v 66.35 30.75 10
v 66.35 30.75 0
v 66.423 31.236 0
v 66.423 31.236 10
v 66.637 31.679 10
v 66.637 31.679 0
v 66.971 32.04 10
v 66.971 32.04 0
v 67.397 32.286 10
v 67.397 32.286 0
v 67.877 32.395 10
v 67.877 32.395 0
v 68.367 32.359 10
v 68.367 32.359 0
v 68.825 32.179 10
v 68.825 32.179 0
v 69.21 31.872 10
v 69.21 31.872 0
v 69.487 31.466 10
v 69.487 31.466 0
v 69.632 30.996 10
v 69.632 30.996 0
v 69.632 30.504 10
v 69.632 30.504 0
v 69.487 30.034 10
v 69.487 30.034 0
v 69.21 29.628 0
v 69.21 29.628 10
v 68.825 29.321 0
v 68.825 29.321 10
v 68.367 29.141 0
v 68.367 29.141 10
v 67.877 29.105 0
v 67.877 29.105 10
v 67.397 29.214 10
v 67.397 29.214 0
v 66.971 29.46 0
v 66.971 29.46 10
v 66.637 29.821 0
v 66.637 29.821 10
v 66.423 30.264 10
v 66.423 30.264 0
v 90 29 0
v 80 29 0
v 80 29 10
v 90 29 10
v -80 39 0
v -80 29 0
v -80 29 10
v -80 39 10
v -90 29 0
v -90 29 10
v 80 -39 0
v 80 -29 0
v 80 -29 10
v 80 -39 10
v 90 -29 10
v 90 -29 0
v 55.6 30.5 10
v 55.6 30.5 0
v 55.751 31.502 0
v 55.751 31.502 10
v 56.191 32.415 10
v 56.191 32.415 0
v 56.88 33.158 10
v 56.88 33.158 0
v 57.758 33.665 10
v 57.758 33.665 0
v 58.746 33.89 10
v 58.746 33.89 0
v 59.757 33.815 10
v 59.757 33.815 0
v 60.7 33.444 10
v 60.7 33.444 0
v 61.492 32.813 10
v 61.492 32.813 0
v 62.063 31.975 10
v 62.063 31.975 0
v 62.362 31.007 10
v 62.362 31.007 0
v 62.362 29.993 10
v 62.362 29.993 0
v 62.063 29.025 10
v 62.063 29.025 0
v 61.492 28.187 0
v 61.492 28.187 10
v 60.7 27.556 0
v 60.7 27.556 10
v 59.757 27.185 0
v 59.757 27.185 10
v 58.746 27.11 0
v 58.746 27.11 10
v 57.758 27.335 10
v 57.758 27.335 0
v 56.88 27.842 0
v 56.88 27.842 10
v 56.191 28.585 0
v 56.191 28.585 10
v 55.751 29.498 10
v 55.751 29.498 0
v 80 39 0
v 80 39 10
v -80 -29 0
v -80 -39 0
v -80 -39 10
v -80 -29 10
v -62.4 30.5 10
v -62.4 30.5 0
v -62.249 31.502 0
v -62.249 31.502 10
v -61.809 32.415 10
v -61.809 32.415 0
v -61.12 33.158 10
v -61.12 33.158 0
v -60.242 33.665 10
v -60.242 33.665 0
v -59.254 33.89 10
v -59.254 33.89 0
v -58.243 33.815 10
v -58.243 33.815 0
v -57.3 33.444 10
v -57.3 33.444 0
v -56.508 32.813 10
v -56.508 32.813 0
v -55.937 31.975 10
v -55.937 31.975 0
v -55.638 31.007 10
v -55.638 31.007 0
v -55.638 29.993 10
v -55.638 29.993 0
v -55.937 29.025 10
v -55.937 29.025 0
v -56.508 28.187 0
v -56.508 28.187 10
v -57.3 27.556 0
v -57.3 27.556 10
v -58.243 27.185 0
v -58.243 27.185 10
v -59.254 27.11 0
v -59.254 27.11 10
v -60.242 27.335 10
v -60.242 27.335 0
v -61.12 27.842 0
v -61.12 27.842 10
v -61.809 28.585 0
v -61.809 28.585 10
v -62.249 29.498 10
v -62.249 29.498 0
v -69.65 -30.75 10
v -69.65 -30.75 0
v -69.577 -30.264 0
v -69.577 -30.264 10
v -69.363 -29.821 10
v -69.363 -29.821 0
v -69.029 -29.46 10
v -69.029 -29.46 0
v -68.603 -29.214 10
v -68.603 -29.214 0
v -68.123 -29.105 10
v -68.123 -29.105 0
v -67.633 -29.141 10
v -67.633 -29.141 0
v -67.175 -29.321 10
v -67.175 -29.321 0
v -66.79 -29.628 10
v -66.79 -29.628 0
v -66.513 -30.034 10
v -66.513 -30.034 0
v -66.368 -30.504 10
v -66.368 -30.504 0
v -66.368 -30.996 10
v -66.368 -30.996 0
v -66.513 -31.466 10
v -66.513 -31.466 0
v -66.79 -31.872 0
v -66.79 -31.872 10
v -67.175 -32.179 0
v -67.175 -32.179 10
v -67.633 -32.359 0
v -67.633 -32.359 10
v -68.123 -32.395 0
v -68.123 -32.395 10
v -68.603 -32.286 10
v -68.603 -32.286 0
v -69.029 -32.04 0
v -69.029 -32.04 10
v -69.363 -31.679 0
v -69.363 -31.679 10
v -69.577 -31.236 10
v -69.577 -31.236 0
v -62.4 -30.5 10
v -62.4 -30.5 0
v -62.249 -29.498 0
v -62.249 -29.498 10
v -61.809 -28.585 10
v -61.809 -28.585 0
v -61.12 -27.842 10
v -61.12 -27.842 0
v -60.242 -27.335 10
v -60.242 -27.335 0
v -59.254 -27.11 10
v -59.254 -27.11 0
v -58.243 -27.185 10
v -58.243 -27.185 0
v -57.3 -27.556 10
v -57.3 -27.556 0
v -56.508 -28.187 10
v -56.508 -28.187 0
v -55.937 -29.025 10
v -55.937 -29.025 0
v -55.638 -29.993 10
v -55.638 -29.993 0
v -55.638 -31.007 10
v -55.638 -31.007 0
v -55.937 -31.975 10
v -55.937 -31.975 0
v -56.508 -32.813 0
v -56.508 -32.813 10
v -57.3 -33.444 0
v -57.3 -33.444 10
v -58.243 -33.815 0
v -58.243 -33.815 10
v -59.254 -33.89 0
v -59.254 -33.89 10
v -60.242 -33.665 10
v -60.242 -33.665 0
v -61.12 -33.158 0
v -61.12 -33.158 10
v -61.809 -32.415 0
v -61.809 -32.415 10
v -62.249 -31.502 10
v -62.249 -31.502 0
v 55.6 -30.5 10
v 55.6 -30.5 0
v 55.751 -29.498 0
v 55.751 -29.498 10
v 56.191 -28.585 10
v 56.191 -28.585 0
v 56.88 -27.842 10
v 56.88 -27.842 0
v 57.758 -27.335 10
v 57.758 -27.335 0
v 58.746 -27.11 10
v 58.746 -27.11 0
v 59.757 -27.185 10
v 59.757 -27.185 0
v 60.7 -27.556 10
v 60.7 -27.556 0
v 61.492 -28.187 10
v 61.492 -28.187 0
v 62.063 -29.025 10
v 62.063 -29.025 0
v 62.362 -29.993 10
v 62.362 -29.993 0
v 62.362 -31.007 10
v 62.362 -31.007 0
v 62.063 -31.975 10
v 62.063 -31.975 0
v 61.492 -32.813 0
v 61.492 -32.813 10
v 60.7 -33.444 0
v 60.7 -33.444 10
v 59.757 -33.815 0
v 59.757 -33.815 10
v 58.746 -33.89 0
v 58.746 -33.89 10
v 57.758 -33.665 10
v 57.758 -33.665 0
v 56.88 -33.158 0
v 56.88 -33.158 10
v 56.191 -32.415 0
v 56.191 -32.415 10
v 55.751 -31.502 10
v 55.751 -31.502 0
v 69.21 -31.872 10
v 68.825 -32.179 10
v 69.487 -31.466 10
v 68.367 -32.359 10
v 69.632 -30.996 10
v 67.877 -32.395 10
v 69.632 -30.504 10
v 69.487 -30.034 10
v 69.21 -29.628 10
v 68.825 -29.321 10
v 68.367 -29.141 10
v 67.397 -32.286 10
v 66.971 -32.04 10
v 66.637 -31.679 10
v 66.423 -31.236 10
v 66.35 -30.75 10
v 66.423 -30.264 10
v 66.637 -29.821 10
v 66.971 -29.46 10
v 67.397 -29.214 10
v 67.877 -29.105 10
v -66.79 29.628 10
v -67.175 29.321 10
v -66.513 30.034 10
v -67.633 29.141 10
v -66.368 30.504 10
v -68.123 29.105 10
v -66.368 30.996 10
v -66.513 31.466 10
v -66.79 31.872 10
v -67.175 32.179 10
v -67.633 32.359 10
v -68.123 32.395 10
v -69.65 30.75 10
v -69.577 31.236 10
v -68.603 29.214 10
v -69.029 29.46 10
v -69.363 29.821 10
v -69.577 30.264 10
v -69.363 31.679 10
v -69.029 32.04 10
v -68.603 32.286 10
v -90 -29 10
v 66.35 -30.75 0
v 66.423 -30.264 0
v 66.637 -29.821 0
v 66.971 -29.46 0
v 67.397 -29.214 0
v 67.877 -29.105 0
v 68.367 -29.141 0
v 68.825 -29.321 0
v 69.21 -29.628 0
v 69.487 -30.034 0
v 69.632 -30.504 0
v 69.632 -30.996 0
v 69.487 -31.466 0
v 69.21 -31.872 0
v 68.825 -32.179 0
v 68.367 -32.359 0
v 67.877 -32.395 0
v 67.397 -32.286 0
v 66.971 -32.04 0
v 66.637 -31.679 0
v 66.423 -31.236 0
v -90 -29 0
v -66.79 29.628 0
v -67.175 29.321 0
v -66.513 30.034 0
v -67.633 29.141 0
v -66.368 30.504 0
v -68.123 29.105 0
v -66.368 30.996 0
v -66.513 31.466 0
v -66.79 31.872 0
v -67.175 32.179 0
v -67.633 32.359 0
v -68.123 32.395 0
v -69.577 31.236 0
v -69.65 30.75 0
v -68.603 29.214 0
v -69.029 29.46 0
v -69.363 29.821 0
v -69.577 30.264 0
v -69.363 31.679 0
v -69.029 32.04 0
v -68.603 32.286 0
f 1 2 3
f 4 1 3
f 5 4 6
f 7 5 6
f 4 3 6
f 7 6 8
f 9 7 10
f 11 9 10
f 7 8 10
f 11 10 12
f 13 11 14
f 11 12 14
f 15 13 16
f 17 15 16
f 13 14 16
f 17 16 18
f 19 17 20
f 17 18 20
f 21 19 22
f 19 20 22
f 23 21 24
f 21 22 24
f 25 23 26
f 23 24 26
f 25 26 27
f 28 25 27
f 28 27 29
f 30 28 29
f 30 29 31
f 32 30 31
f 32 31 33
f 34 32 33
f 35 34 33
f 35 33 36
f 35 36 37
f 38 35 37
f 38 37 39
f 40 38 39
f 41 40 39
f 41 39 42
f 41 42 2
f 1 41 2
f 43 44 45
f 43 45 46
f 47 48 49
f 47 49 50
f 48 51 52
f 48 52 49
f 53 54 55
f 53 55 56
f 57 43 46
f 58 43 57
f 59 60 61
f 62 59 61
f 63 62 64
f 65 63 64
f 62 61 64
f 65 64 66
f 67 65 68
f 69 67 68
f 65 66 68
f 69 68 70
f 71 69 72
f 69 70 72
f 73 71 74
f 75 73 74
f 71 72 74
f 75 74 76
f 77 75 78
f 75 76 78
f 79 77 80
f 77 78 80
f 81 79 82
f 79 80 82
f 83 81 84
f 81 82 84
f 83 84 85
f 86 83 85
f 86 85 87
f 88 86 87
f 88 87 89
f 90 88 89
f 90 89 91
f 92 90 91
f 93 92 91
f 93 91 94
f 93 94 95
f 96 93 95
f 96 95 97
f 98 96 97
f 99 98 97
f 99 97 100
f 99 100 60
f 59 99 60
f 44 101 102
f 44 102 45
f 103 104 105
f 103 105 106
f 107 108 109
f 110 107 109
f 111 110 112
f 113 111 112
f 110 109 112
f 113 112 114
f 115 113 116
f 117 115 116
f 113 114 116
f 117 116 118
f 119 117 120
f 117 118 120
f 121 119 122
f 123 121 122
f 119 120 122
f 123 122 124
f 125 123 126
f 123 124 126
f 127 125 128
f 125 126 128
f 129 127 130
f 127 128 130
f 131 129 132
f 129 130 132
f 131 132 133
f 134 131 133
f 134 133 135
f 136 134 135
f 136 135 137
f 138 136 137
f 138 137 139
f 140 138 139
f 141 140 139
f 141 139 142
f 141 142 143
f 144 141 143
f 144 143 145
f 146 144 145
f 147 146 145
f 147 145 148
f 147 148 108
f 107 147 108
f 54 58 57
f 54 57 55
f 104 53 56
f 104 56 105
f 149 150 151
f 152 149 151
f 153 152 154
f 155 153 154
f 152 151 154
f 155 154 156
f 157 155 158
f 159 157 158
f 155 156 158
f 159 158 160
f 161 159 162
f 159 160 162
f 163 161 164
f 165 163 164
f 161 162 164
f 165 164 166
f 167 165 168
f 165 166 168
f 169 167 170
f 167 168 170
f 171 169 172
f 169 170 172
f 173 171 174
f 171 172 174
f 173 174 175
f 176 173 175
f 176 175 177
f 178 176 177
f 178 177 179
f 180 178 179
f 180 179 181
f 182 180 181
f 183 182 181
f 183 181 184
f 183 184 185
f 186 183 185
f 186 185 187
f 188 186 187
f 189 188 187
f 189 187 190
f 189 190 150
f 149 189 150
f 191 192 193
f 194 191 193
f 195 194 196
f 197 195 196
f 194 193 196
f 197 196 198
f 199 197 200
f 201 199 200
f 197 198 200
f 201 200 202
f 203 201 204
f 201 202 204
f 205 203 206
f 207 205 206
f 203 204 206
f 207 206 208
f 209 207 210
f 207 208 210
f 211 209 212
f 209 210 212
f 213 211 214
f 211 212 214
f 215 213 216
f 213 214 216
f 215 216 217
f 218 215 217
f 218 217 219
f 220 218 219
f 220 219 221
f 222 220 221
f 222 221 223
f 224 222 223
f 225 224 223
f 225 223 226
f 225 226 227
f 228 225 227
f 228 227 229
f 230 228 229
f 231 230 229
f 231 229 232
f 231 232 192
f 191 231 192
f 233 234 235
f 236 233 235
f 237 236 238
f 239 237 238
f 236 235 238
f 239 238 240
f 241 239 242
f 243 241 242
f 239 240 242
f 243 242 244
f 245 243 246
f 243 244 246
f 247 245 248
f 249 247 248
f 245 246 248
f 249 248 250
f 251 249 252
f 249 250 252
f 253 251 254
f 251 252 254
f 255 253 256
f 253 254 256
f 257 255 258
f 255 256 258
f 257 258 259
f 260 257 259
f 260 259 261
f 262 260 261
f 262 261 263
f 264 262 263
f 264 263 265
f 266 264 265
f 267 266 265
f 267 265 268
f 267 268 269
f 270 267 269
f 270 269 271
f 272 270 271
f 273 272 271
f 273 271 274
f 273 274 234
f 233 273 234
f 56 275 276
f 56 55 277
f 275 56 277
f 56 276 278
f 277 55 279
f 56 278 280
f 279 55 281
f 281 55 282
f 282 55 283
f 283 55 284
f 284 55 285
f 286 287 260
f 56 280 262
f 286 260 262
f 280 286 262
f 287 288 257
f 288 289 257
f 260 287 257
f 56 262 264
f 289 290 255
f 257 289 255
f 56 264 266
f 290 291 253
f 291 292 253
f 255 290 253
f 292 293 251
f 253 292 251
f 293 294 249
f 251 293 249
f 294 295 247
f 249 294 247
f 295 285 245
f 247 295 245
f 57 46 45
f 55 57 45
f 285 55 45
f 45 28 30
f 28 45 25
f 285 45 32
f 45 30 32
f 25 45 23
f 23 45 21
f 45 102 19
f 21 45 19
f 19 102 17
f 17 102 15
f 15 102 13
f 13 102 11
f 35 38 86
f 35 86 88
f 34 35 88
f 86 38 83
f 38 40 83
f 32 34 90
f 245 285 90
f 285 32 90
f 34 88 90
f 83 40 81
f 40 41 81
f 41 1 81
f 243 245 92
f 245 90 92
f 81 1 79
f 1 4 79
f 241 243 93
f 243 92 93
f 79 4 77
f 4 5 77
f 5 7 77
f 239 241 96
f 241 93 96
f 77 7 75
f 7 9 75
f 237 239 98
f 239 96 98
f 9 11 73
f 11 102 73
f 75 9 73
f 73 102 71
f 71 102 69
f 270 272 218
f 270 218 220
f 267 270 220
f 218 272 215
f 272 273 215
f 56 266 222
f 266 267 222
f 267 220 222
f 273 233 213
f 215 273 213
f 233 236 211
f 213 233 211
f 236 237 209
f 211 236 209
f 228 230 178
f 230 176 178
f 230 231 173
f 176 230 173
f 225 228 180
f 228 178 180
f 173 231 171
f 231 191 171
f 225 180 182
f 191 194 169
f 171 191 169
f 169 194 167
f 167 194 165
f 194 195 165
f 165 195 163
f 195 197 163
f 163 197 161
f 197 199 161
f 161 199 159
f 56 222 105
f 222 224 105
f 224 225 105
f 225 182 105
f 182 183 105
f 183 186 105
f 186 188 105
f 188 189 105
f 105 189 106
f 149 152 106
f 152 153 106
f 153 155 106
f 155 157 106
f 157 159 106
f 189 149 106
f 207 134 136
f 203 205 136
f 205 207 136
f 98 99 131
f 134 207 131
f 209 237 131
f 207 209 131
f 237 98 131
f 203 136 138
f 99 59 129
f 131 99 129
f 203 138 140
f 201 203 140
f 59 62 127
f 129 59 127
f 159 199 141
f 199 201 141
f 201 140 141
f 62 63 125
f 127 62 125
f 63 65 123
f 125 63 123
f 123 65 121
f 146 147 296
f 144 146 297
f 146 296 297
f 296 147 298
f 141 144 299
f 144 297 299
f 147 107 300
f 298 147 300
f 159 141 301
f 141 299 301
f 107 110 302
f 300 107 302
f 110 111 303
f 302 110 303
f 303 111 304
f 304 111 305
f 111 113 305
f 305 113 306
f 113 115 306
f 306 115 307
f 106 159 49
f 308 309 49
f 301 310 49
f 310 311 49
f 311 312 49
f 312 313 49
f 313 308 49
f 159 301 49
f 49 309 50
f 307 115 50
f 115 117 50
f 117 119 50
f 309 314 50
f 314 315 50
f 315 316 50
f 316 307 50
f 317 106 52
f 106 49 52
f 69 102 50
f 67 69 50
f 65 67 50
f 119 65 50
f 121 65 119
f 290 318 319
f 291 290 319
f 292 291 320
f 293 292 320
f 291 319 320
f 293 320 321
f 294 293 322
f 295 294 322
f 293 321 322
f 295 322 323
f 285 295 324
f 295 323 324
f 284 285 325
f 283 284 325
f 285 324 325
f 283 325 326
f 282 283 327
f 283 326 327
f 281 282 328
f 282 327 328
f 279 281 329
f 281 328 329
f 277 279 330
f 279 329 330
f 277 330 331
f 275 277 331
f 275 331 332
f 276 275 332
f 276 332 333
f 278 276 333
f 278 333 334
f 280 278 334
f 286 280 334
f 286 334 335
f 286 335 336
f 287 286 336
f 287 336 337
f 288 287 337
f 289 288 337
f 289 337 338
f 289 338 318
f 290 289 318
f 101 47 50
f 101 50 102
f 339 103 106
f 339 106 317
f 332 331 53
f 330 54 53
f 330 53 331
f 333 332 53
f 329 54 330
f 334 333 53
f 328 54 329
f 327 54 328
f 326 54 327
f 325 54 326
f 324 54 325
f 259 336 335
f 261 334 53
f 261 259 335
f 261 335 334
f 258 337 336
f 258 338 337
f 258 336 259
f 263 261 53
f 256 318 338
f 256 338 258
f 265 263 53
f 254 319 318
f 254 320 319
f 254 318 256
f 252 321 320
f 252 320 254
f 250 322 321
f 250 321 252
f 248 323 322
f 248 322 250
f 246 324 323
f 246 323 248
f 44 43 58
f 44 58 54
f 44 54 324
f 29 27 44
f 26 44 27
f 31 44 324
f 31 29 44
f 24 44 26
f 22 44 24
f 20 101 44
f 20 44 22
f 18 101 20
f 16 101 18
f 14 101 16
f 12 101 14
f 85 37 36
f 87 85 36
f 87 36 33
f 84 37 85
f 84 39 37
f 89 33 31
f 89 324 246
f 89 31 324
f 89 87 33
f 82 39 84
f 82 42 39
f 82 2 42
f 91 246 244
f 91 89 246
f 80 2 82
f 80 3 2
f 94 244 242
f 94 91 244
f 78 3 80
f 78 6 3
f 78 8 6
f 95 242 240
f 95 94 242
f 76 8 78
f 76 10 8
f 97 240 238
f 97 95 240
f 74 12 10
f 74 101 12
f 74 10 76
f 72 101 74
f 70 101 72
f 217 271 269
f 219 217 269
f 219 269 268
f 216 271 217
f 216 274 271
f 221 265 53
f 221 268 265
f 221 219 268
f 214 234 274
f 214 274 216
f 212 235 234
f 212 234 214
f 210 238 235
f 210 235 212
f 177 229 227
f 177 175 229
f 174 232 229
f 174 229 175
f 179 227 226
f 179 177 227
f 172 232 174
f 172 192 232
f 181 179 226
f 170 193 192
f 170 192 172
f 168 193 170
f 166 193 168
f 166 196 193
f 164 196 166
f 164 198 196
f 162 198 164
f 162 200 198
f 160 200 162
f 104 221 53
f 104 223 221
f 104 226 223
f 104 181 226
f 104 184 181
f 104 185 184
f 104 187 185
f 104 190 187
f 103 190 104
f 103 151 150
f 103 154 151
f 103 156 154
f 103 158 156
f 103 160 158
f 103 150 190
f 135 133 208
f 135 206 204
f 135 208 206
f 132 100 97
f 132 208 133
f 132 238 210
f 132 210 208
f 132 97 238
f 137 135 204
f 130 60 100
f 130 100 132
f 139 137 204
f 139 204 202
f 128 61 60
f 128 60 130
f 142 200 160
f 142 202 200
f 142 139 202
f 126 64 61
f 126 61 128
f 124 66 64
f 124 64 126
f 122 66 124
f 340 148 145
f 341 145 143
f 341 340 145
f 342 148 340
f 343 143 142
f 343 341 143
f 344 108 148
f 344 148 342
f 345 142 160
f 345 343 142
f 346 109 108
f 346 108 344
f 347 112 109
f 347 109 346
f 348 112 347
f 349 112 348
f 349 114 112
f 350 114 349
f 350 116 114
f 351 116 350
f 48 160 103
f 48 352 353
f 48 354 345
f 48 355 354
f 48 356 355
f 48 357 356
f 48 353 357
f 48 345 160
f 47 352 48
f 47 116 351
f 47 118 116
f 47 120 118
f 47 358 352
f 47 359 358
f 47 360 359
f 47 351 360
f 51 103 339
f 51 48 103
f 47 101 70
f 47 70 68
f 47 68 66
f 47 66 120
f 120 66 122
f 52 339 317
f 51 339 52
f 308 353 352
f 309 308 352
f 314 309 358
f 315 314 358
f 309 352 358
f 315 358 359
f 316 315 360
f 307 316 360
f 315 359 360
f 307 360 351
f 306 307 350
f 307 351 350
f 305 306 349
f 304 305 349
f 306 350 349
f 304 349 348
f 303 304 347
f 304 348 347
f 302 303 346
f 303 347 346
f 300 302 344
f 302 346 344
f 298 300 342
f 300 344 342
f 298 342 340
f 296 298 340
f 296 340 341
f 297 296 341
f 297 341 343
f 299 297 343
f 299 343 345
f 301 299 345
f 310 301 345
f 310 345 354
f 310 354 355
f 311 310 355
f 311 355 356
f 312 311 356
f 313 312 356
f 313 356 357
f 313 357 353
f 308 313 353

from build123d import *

# Parameters (mm, degrees)
BOSS_EXTRUDE1_DEPTH = 10
M4_TAPPED_HOLE1_D   = 3.3
M8_TAPPED_HOLE1_D   = 6.8


with BuildPart() as part:
    # Sketch1 → Boss-Extrude1 (new body)
    with BuildSketch(Plane.XY):
        Polygon((-80, 39), (80, 39), (80, 29), (90, 29), (90, -29), (80, -29), (80, -39), (-80, -39), (-80, -29), (-90, -29), (-90, 29), (-80, 29), align=None)
    extrude(amount=BOSS_EXTRUDE1_DEPTH)

    # M4 Tapped Hole1 (through all)
    with Locations(Plane.XY.offset(10)):
        with Locations((-68, 30.75), (-68, -30.75), (68, -30.75), (68, 30.75)):
            Hole(M4_TAPPED_HOLE1_D / 2)

    # M8 Tapped Hole1 (through all)
    with Locations(Plane.XY.offset(10)):
        with Locations((-59, 30.5), (-59, -30.5), (59, -30.5), (59, 30.5)):
            Hole(M8_TAPPED_HOLE1_D / 2)


solid = part.part
